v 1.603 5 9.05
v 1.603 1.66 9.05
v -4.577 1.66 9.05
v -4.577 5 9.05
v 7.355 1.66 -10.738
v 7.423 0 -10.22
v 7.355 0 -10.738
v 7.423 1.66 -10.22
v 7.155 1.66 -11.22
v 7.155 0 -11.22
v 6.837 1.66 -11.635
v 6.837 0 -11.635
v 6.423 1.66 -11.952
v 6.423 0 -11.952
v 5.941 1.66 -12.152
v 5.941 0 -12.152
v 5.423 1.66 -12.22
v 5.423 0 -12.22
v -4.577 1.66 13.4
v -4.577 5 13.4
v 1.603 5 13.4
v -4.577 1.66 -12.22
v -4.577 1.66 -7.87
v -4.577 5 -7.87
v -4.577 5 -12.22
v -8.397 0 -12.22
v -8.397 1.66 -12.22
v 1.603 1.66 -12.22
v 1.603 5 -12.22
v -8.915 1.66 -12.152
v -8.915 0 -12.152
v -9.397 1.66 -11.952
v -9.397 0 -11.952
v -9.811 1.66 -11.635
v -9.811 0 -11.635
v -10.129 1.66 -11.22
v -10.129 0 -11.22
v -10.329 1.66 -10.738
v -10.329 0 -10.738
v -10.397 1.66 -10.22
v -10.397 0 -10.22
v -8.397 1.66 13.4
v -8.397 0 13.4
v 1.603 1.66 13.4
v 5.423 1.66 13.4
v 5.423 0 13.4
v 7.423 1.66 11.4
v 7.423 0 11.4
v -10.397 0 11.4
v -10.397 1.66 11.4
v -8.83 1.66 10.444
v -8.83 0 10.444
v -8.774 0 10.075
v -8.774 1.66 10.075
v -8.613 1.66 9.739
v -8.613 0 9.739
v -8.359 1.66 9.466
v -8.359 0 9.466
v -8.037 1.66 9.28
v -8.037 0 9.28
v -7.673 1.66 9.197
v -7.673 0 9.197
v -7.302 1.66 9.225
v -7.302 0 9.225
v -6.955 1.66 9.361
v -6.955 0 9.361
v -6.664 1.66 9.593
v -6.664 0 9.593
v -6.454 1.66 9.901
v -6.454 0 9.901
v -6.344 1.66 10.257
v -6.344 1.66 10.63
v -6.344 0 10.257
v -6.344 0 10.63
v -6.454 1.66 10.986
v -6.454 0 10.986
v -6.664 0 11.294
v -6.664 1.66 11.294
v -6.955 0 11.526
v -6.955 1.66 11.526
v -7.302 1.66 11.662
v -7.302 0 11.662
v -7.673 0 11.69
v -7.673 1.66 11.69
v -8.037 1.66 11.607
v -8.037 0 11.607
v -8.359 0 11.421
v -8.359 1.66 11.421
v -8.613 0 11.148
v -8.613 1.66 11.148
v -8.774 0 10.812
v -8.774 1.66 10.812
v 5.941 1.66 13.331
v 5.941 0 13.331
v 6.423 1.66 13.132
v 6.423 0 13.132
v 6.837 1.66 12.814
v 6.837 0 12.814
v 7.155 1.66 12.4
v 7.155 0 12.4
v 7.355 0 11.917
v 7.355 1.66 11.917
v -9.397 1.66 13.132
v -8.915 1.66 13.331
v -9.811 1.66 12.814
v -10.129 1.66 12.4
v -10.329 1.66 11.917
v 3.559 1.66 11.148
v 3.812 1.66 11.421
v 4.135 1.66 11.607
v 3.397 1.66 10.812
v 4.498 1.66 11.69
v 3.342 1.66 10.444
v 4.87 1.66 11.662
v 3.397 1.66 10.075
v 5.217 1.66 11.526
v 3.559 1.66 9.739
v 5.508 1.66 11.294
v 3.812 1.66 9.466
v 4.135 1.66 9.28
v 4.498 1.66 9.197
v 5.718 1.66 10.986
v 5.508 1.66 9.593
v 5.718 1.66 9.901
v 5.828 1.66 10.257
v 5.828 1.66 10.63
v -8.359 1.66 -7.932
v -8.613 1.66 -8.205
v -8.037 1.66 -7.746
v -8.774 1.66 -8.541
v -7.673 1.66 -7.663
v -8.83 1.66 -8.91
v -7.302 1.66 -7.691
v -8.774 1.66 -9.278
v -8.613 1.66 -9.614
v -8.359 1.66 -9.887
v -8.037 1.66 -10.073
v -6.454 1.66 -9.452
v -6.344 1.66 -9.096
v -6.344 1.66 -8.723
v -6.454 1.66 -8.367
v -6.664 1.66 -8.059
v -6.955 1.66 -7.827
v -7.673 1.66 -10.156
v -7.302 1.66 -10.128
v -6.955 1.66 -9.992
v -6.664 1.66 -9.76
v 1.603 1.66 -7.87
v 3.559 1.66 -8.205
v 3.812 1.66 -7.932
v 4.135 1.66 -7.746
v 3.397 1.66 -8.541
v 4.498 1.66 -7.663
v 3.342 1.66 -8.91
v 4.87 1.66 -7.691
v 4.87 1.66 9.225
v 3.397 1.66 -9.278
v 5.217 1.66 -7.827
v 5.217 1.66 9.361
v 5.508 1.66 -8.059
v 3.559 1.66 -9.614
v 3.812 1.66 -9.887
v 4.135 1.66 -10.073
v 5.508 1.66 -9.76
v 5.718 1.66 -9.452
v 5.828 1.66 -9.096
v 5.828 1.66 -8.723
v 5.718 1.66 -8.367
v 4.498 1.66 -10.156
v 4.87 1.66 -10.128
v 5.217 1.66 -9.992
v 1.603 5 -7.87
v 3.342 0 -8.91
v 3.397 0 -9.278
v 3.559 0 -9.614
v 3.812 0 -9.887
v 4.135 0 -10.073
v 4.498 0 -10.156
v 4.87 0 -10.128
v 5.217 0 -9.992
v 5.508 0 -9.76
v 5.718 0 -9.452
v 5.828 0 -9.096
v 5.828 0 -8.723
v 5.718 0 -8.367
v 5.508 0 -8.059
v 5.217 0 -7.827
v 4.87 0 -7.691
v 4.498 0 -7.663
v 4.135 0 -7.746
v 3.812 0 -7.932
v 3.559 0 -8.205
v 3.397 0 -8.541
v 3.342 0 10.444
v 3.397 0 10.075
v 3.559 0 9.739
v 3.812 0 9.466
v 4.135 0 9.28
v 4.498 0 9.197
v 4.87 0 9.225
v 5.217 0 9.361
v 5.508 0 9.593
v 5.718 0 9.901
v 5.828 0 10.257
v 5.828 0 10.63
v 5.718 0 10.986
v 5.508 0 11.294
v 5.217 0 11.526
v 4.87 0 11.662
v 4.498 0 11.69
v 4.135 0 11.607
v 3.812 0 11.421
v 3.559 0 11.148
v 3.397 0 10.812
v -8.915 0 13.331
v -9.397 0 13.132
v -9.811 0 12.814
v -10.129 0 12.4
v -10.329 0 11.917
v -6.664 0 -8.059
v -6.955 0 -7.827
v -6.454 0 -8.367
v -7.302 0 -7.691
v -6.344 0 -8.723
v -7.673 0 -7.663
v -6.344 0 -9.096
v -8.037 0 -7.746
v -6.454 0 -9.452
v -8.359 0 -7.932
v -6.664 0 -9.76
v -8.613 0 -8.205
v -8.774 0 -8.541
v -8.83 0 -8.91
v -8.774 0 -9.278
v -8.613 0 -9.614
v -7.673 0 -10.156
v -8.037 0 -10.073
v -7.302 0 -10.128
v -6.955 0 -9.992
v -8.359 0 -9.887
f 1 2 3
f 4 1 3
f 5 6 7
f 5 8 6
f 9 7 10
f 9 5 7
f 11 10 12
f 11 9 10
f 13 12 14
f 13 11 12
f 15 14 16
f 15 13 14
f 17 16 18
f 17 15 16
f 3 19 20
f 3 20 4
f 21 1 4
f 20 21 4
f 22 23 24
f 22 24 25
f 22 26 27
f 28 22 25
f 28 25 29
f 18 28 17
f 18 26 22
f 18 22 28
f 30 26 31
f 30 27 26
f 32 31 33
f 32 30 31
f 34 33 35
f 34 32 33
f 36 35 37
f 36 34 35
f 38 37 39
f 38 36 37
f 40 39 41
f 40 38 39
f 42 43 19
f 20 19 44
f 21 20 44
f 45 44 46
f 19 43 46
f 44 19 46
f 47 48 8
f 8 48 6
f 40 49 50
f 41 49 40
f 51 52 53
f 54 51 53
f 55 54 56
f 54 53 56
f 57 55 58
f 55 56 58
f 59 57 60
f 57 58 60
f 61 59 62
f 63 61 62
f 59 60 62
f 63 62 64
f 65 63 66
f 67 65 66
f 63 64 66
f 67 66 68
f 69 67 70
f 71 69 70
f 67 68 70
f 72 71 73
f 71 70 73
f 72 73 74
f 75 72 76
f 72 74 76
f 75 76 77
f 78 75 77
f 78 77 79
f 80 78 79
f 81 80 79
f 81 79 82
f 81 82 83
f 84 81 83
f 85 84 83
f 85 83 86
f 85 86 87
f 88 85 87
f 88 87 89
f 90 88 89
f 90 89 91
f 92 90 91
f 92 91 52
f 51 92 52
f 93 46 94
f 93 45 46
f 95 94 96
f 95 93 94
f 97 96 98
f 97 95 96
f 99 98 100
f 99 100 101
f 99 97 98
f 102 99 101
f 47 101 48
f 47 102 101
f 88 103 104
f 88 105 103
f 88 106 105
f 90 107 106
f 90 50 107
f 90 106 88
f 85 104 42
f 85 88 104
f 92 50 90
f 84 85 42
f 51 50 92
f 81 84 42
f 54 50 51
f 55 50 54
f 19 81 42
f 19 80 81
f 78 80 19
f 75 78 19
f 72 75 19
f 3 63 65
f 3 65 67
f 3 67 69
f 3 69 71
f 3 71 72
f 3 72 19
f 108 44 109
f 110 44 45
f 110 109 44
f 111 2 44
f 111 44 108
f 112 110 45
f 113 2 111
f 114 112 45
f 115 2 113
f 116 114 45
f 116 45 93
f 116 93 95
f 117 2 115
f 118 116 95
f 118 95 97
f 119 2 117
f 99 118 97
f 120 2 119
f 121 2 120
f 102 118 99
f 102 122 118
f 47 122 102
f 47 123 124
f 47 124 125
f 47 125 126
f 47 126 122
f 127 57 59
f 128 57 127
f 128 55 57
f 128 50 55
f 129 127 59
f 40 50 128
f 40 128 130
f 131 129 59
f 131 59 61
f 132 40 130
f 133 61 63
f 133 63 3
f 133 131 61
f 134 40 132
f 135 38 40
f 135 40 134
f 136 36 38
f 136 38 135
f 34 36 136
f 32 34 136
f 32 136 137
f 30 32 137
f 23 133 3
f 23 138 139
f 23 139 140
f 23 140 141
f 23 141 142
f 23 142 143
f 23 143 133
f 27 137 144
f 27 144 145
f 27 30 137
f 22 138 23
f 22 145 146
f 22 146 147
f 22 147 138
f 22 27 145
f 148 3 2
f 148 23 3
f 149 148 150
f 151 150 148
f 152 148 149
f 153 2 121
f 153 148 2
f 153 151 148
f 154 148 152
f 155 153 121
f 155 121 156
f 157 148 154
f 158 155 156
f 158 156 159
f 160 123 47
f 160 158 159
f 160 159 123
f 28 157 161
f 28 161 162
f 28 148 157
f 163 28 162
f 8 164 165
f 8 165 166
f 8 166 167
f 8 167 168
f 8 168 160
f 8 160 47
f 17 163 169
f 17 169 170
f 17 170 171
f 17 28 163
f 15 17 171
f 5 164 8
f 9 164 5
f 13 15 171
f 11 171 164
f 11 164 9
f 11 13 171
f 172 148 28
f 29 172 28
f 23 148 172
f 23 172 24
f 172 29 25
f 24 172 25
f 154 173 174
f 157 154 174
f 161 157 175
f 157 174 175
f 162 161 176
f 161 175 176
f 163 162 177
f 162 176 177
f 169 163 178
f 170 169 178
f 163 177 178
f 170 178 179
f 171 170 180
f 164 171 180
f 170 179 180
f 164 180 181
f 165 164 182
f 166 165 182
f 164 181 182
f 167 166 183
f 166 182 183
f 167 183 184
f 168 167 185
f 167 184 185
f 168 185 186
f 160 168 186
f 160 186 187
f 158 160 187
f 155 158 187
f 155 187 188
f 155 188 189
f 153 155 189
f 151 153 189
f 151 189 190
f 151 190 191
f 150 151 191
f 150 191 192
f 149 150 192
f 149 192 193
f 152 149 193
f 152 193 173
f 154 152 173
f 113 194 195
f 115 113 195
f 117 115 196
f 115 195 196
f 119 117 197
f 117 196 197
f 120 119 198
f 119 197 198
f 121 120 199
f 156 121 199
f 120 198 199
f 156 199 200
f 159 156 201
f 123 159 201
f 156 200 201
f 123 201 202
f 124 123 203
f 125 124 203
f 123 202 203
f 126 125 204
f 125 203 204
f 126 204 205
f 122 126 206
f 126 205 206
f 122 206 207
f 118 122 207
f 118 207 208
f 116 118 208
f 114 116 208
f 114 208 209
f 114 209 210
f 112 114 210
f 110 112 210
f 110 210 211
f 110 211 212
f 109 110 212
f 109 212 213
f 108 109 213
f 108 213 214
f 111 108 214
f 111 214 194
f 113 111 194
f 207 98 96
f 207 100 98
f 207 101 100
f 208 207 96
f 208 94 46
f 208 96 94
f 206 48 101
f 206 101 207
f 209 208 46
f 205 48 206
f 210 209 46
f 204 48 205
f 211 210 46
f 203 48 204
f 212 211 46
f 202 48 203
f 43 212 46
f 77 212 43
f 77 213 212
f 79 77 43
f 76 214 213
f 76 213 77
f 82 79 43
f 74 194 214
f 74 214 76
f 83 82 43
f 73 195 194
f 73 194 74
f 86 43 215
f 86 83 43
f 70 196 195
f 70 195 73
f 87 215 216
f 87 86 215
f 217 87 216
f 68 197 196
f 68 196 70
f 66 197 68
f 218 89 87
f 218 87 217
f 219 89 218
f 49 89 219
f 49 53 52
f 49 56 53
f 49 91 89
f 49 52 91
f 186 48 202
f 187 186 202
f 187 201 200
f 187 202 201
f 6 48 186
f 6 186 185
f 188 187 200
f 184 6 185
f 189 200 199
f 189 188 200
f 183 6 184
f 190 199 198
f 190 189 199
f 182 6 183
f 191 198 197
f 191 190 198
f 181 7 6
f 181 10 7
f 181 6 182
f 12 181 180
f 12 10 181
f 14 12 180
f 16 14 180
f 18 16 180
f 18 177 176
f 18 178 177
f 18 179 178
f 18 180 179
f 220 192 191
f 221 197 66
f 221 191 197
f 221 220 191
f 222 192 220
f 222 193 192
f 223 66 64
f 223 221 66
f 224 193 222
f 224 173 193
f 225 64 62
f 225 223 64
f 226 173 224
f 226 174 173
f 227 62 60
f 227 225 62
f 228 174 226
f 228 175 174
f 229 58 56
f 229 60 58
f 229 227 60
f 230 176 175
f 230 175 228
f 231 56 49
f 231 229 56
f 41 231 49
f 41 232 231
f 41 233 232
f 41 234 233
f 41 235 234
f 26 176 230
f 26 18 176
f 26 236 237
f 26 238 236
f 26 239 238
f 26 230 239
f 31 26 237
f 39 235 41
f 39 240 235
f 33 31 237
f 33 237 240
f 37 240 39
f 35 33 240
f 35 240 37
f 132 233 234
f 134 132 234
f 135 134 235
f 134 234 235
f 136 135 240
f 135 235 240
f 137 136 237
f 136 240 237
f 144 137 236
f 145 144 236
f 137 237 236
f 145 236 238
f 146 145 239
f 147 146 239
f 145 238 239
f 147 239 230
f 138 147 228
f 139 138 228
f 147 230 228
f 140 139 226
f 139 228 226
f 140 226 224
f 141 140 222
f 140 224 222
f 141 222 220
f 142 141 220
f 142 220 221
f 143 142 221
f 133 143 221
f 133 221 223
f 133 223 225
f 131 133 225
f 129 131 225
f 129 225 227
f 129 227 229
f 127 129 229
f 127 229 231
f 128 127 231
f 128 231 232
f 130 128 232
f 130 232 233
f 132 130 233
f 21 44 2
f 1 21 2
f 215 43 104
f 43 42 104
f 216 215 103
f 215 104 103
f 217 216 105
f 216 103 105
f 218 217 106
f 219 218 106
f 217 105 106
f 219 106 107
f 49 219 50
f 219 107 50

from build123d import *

# Parameters (mm, degrees)
SKETCH1_W           = 17.82
SKETCH1_H           = 25.62
BOSS_EXTRUDE1_DEPTH = 1.66
SKETCH2_W           = 6.18
SKETCH2_H           = 4.35
BOSS_EXTRUDE2_DEPTH = 5
FILLET1_R           = 2
HOLE1_D             = 2.5


with BuildPart() as part:
    # Sketch1 → Boss-Extrude1 (new body)
    with BuildSketch(Plane(origin=(0, 0, 0), x_dir=(1, 0, 0), z_dir=(0, 1, 0))):
        with Locations((-1.487037037, -0.58962963)):
            Rectangle(SKETCH1_W, SKETCH1_H)
    extrude(amount=BOSS_EXTRUDE1_DEPTH)

    # Sketch2 → Boss-Extrude2 (add)
    with BuildSketch(Plane(origin=(0, 0, 0), x_dir=(-1, 0, 0), z_dir=(0, -1, 0))):
        with Locations((1.487037037, -11.22462963)):
            Rectangle(SKETCH2_W, SKETCH2_H)
        with Locations((1.487037037, 10.04537037)):
            Rectangle(SKETCH2_W, SKETCH2_H)
    extrude(amount=-BOSS_EXTRUDE2_DEPTH)

    # Fillet1
    fillet1_edges = [part.edges().sort_by_distance(p)[0] for p in [
        (-10.397037037, 0.83, -12.22037037),
        (7.422962963, 0.83, -12.22037037),
        (7.422962963, 0.83, 13.39962963),
        (-10.397037037, 0.83, 13.39962963),
    ]]
    fillet(fillet1_edges, radius=FILLET1_R)

    # Hole1 (through all)
    with Locations(Plane(origin=(0, 1.66, 0), x_dir=(1, 0, 0), z_dir=(0, 1, 0))):
        with Locations((4.591727838, -10.44356219), (-7.580024265, -10.44356219), (-7.580024265, 8.909603349), (4.591727838, 8.909603349)):
            Hole(HOLE1_D / 2)


solid = part.part
